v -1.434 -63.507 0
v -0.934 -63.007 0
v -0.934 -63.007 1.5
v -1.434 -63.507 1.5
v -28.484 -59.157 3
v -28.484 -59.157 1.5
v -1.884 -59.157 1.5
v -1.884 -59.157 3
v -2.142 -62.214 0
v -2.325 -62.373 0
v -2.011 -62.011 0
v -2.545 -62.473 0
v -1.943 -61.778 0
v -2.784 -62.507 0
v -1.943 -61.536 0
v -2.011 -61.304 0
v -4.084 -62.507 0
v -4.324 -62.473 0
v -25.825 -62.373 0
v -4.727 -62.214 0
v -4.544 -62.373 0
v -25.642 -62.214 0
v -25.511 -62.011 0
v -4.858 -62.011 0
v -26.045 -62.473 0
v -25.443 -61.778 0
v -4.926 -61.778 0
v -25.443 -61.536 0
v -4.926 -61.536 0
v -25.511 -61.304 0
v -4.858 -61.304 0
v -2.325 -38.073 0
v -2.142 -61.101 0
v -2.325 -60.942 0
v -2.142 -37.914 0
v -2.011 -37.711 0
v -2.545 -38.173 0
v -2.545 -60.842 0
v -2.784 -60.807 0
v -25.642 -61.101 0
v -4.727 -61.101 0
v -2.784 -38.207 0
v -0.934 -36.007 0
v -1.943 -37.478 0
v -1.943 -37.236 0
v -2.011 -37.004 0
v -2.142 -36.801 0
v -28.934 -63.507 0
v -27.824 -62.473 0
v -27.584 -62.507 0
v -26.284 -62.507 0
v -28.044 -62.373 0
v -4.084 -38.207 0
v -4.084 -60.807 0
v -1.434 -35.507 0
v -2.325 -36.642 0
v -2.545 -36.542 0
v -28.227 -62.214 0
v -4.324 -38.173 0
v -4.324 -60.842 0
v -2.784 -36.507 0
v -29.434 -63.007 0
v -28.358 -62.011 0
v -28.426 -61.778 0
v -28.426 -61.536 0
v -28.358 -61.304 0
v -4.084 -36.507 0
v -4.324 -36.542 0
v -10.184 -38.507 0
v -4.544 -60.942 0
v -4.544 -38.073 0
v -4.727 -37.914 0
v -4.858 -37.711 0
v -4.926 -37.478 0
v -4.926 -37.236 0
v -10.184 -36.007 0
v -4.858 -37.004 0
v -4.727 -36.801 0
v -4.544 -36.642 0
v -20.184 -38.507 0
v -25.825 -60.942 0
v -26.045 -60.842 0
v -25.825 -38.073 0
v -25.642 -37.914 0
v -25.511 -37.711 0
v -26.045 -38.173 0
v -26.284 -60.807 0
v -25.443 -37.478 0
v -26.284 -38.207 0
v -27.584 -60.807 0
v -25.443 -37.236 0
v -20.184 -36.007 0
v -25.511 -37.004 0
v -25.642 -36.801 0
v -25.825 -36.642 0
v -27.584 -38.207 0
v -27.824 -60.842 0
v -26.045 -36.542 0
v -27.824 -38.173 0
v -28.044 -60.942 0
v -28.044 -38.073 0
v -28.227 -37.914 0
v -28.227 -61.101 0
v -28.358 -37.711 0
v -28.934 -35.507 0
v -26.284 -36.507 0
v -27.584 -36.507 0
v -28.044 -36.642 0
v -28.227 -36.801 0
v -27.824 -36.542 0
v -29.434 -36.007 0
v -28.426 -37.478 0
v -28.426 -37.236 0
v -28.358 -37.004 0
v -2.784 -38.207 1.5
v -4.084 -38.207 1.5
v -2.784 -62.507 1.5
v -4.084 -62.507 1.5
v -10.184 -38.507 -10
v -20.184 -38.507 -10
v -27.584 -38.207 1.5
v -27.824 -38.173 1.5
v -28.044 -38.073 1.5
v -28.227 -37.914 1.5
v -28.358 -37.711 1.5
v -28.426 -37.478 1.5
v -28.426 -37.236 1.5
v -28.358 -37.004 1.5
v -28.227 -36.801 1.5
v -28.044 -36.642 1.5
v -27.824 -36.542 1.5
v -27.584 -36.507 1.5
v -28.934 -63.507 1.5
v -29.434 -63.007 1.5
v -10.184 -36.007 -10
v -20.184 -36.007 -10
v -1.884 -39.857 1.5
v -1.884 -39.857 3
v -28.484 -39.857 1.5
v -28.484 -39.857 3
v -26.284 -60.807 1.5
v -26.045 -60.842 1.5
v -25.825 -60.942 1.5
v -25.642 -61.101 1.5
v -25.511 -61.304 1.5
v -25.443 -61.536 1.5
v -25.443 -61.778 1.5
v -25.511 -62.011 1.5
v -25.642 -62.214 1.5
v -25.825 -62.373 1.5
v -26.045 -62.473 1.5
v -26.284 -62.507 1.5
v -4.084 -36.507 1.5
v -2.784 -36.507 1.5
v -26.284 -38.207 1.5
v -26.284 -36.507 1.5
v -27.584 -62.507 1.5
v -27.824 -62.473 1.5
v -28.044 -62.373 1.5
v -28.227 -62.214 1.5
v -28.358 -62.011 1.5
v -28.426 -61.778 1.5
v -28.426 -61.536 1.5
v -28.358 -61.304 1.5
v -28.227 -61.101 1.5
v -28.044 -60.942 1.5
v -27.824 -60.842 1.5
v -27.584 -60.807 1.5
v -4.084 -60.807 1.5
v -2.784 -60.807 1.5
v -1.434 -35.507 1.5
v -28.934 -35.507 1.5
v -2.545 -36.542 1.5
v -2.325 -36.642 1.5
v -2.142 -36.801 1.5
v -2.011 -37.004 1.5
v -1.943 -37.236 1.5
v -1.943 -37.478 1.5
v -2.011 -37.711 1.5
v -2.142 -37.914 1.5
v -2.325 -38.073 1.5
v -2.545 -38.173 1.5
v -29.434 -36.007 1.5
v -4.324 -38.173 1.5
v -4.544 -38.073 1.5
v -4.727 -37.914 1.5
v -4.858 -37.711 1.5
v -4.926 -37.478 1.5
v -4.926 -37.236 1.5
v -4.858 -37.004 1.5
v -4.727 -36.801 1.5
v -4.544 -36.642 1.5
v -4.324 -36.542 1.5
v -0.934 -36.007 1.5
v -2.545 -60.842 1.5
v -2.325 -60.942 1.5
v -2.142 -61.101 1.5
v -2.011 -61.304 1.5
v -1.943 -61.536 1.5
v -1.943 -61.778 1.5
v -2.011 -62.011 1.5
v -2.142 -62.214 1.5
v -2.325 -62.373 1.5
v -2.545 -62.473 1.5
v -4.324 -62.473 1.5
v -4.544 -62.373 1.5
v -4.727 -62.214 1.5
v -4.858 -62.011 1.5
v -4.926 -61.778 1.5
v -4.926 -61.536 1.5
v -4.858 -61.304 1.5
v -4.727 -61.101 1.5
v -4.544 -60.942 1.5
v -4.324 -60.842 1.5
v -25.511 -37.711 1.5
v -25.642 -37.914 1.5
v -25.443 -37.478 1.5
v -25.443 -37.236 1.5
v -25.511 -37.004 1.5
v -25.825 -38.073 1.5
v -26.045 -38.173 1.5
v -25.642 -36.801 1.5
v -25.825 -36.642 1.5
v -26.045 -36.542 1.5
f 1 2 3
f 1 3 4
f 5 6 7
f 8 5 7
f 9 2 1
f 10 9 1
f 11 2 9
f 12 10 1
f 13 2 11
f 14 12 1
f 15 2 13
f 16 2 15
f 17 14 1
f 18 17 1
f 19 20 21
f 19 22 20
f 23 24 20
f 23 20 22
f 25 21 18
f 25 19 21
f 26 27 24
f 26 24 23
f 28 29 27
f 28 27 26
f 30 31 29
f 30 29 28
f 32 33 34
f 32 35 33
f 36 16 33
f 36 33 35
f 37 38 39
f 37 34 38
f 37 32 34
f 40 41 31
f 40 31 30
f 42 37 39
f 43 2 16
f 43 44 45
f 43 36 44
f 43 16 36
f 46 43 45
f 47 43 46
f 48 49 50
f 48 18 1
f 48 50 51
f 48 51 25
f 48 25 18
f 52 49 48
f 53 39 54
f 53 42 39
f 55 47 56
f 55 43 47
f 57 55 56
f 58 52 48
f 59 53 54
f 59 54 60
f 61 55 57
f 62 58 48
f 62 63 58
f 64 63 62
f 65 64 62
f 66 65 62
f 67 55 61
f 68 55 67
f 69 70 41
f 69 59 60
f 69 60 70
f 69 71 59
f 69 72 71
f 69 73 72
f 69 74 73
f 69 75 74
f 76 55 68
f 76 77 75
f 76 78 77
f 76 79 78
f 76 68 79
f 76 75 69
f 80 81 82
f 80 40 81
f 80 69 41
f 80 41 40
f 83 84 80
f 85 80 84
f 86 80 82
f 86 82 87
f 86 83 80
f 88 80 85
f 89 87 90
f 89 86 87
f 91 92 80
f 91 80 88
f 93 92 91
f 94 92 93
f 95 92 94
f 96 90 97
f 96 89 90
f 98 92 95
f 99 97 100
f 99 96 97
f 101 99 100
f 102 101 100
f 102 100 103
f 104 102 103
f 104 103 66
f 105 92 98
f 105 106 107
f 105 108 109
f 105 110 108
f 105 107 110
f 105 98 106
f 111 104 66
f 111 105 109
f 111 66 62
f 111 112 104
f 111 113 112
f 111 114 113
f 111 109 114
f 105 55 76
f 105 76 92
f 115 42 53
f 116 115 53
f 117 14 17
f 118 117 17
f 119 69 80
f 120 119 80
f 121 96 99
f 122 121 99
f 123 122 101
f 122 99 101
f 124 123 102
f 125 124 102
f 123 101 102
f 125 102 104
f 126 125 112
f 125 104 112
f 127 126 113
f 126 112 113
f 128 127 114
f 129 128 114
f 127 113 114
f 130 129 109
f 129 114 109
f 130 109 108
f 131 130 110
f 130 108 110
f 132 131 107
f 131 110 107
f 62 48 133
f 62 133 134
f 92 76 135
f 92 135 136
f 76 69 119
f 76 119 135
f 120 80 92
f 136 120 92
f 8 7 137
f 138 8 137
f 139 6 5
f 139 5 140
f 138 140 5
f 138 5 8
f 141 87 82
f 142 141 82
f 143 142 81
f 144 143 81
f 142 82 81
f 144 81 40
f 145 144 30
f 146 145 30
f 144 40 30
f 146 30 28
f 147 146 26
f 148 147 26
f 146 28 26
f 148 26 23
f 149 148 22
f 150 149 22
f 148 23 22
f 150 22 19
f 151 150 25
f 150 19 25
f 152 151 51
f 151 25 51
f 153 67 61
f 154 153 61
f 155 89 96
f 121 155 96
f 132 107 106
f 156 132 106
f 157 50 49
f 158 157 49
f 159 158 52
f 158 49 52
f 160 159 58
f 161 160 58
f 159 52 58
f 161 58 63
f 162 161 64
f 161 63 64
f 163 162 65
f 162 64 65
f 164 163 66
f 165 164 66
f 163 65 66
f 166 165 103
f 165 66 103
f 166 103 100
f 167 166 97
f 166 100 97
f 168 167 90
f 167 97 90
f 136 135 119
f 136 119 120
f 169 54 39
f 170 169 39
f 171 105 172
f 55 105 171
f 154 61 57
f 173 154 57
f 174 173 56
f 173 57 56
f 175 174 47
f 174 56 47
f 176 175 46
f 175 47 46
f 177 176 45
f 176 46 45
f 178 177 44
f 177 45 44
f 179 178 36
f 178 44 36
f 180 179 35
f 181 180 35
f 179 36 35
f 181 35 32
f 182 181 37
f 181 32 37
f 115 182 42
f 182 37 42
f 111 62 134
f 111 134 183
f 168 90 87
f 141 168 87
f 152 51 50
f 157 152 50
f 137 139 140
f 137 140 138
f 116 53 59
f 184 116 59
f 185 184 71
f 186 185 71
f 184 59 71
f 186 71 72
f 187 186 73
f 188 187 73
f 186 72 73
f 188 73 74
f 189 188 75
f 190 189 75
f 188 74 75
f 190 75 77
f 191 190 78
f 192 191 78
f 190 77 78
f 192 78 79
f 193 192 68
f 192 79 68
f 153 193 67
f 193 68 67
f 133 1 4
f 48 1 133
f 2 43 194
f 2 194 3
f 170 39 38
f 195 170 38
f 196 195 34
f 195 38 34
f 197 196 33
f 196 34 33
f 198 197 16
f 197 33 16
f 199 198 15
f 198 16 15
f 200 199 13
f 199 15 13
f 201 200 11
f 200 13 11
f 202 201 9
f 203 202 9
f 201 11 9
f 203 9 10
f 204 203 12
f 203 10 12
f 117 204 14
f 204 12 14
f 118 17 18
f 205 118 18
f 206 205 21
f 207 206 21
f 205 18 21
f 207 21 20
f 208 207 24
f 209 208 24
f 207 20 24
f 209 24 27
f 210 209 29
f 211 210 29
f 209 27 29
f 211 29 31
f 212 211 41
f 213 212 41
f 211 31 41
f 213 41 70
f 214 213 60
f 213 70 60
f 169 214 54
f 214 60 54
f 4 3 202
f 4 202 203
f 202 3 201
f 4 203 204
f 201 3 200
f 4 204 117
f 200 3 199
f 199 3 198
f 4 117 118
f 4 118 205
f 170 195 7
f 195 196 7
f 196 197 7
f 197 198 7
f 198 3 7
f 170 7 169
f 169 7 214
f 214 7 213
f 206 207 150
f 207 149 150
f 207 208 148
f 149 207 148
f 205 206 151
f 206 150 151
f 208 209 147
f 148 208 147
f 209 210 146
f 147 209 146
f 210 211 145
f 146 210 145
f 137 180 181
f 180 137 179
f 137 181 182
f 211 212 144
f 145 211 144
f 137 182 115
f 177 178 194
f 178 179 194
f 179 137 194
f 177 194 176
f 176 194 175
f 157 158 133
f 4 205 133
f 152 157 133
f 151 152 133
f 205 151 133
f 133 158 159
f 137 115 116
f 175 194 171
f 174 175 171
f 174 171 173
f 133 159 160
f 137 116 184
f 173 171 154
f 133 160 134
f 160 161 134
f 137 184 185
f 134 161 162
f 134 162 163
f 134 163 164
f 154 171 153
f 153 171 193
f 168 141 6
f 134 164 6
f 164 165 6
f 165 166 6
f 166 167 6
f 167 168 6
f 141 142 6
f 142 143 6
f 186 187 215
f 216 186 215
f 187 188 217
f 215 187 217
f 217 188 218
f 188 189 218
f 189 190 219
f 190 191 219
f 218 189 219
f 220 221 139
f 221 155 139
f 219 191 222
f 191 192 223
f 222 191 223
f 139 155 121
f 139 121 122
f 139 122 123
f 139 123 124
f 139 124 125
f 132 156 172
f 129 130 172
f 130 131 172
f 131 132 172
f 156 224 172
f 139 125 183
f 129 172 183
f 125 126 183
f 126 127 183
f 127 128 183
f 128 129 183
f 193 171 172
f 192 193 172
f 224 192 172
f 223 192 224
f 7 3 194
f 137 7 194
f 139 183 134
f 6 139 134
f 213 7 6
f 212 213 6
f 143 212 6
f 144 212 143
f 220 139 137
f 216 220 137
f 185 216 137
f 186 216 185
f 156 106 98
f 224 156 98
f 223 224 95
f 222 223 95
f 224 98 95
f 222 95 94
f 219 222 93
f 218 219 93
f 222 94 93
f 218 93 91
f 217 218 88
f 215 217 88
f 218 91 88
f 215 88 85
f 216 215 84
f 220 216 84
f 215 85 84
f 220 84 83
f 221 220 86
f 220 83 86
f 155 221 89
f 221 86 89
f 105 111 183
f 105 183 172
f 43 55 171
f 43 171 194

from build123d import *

# Parameters (mm, degrees)
EXTRUDE_1_DEPTH = 1.5
SKETCH_2_W      = 26.6
SKETCH_2_H      = 19.3
EXTRUDE_2_DEPTH = 1.5
SKETCH_3_W      = 10
SKETCH_3_H      = 2.5
EXTRUDE_3_DEPTH = 10


with BuildPart() as part:
    # 草圖1 → 填料-伸長1 (new body)
    with BuildSketch(Plane.XY):
        Polygon((-28.934480155, -35.507444045), (-1.434480155, -35.507444045), (-0.934480155, -36.007444045), (-0.934480155, -63.007444045), (-1.434480155, -63.507444045), (-28.934480155, -63.507444045), (-29.434480155, -63.007444045), (-29.434480155, -36.007444045), align=None)
        with BuildLine():
            Line((-4.084480155, -36.507444045), (-2.784480155, -36.507444045))
            ThreePointArc((-2.784480155, -36.507444045), (-1.934480155, -37.357444045), (-2.784480155, -38.207444045))
            Line((-2.784480155, -38.207444045), (-4.084480155, -38.207444045))
            ThreePointArc((-4.084480155, -38.207444045), (-4.934480155, -37.357444045), (-4.084480155, -36.507444045))
        make_face(mode=Mode.SUBTRACT)
        with BuildLine():
            Line((-27.584480155, -36.507444045), (-26.284480155, -36.507444045))
            ThreePointArc((-26.284480155, -36.507444045), (-25.434480155, -37.357444045), (-26.284480155, -38.207444045))
            Line((-26.284480155, -38.207444045), (-27.584480155, -38.207444045))
            ThreePointArc((-27.584480155, -38.207444045), (-28.434480155, -37.357444045), (-27.584480155, -36.507444045))
        make_face(mode=Mode.SUBTRACT)
        with BuildLine():
            Line((-27.584480155, -60.807444045), (-26.284480155, -60.807444045))
            ThreePointArc((-26.284480155, -60.807444045), (-25.434480155, -61.657444045), (-26.284480155, -62.507444045))
            Line((-26.284480155, -62.507444045), (-27.584480155, -62.507444045))
            ThreePointArc((-27.584480155, -62.507444045), (-28.434480155, -61.657444045), (-27.584480155, -60.807444045))
        make_face(mode=Mode.SUBTRACT)
        with BuildLine():
            Line((-4.084480155, -60.807444045), (-2.784480155, -60.807444045))
            ThreePointArc((-2.784480155, -60.807444045), (-1.934480155, -61.657444045), (-2.784480155, -62.507444045))
            Line((-2.784480155, -62.507444045), (-4.084480155, -62.507444045))
            ThreePointArc((-4.084480155, -62.507444045), (-4.934480155, -61.657444045), (-4.084480155, -60.807444045))
        make_face(mode=Mode.SUBTRACT)
    extrude(amount=EXTRUDE_1_DEPTH)

    # 草圖2 → 填料-伸長2 (add)
    with BuildSketch(Plane.XY.offset(1.5)):
        with Locations((-15.184480155, -49.507444045)):
            Rectangle(SKETCH_2_W, SKETCH_2_H)
    extrude(amount=EXTRUDE_2_DEPTH)

    # 草圖3 → 填料-伸長3 (add)
    with BuildSketch(Plane(origin=(0, 0, 0), x_dir=(-1, 0, 0), z_dir=(0, 0, -1))):
        with Locations((15.184480155, -37.257444045)):
            Rectangle(SKETCH_3_W, SKETCH_3_H)
    extrude(amount=EXTRUDE_3_DEPTH)


solid = part.part
